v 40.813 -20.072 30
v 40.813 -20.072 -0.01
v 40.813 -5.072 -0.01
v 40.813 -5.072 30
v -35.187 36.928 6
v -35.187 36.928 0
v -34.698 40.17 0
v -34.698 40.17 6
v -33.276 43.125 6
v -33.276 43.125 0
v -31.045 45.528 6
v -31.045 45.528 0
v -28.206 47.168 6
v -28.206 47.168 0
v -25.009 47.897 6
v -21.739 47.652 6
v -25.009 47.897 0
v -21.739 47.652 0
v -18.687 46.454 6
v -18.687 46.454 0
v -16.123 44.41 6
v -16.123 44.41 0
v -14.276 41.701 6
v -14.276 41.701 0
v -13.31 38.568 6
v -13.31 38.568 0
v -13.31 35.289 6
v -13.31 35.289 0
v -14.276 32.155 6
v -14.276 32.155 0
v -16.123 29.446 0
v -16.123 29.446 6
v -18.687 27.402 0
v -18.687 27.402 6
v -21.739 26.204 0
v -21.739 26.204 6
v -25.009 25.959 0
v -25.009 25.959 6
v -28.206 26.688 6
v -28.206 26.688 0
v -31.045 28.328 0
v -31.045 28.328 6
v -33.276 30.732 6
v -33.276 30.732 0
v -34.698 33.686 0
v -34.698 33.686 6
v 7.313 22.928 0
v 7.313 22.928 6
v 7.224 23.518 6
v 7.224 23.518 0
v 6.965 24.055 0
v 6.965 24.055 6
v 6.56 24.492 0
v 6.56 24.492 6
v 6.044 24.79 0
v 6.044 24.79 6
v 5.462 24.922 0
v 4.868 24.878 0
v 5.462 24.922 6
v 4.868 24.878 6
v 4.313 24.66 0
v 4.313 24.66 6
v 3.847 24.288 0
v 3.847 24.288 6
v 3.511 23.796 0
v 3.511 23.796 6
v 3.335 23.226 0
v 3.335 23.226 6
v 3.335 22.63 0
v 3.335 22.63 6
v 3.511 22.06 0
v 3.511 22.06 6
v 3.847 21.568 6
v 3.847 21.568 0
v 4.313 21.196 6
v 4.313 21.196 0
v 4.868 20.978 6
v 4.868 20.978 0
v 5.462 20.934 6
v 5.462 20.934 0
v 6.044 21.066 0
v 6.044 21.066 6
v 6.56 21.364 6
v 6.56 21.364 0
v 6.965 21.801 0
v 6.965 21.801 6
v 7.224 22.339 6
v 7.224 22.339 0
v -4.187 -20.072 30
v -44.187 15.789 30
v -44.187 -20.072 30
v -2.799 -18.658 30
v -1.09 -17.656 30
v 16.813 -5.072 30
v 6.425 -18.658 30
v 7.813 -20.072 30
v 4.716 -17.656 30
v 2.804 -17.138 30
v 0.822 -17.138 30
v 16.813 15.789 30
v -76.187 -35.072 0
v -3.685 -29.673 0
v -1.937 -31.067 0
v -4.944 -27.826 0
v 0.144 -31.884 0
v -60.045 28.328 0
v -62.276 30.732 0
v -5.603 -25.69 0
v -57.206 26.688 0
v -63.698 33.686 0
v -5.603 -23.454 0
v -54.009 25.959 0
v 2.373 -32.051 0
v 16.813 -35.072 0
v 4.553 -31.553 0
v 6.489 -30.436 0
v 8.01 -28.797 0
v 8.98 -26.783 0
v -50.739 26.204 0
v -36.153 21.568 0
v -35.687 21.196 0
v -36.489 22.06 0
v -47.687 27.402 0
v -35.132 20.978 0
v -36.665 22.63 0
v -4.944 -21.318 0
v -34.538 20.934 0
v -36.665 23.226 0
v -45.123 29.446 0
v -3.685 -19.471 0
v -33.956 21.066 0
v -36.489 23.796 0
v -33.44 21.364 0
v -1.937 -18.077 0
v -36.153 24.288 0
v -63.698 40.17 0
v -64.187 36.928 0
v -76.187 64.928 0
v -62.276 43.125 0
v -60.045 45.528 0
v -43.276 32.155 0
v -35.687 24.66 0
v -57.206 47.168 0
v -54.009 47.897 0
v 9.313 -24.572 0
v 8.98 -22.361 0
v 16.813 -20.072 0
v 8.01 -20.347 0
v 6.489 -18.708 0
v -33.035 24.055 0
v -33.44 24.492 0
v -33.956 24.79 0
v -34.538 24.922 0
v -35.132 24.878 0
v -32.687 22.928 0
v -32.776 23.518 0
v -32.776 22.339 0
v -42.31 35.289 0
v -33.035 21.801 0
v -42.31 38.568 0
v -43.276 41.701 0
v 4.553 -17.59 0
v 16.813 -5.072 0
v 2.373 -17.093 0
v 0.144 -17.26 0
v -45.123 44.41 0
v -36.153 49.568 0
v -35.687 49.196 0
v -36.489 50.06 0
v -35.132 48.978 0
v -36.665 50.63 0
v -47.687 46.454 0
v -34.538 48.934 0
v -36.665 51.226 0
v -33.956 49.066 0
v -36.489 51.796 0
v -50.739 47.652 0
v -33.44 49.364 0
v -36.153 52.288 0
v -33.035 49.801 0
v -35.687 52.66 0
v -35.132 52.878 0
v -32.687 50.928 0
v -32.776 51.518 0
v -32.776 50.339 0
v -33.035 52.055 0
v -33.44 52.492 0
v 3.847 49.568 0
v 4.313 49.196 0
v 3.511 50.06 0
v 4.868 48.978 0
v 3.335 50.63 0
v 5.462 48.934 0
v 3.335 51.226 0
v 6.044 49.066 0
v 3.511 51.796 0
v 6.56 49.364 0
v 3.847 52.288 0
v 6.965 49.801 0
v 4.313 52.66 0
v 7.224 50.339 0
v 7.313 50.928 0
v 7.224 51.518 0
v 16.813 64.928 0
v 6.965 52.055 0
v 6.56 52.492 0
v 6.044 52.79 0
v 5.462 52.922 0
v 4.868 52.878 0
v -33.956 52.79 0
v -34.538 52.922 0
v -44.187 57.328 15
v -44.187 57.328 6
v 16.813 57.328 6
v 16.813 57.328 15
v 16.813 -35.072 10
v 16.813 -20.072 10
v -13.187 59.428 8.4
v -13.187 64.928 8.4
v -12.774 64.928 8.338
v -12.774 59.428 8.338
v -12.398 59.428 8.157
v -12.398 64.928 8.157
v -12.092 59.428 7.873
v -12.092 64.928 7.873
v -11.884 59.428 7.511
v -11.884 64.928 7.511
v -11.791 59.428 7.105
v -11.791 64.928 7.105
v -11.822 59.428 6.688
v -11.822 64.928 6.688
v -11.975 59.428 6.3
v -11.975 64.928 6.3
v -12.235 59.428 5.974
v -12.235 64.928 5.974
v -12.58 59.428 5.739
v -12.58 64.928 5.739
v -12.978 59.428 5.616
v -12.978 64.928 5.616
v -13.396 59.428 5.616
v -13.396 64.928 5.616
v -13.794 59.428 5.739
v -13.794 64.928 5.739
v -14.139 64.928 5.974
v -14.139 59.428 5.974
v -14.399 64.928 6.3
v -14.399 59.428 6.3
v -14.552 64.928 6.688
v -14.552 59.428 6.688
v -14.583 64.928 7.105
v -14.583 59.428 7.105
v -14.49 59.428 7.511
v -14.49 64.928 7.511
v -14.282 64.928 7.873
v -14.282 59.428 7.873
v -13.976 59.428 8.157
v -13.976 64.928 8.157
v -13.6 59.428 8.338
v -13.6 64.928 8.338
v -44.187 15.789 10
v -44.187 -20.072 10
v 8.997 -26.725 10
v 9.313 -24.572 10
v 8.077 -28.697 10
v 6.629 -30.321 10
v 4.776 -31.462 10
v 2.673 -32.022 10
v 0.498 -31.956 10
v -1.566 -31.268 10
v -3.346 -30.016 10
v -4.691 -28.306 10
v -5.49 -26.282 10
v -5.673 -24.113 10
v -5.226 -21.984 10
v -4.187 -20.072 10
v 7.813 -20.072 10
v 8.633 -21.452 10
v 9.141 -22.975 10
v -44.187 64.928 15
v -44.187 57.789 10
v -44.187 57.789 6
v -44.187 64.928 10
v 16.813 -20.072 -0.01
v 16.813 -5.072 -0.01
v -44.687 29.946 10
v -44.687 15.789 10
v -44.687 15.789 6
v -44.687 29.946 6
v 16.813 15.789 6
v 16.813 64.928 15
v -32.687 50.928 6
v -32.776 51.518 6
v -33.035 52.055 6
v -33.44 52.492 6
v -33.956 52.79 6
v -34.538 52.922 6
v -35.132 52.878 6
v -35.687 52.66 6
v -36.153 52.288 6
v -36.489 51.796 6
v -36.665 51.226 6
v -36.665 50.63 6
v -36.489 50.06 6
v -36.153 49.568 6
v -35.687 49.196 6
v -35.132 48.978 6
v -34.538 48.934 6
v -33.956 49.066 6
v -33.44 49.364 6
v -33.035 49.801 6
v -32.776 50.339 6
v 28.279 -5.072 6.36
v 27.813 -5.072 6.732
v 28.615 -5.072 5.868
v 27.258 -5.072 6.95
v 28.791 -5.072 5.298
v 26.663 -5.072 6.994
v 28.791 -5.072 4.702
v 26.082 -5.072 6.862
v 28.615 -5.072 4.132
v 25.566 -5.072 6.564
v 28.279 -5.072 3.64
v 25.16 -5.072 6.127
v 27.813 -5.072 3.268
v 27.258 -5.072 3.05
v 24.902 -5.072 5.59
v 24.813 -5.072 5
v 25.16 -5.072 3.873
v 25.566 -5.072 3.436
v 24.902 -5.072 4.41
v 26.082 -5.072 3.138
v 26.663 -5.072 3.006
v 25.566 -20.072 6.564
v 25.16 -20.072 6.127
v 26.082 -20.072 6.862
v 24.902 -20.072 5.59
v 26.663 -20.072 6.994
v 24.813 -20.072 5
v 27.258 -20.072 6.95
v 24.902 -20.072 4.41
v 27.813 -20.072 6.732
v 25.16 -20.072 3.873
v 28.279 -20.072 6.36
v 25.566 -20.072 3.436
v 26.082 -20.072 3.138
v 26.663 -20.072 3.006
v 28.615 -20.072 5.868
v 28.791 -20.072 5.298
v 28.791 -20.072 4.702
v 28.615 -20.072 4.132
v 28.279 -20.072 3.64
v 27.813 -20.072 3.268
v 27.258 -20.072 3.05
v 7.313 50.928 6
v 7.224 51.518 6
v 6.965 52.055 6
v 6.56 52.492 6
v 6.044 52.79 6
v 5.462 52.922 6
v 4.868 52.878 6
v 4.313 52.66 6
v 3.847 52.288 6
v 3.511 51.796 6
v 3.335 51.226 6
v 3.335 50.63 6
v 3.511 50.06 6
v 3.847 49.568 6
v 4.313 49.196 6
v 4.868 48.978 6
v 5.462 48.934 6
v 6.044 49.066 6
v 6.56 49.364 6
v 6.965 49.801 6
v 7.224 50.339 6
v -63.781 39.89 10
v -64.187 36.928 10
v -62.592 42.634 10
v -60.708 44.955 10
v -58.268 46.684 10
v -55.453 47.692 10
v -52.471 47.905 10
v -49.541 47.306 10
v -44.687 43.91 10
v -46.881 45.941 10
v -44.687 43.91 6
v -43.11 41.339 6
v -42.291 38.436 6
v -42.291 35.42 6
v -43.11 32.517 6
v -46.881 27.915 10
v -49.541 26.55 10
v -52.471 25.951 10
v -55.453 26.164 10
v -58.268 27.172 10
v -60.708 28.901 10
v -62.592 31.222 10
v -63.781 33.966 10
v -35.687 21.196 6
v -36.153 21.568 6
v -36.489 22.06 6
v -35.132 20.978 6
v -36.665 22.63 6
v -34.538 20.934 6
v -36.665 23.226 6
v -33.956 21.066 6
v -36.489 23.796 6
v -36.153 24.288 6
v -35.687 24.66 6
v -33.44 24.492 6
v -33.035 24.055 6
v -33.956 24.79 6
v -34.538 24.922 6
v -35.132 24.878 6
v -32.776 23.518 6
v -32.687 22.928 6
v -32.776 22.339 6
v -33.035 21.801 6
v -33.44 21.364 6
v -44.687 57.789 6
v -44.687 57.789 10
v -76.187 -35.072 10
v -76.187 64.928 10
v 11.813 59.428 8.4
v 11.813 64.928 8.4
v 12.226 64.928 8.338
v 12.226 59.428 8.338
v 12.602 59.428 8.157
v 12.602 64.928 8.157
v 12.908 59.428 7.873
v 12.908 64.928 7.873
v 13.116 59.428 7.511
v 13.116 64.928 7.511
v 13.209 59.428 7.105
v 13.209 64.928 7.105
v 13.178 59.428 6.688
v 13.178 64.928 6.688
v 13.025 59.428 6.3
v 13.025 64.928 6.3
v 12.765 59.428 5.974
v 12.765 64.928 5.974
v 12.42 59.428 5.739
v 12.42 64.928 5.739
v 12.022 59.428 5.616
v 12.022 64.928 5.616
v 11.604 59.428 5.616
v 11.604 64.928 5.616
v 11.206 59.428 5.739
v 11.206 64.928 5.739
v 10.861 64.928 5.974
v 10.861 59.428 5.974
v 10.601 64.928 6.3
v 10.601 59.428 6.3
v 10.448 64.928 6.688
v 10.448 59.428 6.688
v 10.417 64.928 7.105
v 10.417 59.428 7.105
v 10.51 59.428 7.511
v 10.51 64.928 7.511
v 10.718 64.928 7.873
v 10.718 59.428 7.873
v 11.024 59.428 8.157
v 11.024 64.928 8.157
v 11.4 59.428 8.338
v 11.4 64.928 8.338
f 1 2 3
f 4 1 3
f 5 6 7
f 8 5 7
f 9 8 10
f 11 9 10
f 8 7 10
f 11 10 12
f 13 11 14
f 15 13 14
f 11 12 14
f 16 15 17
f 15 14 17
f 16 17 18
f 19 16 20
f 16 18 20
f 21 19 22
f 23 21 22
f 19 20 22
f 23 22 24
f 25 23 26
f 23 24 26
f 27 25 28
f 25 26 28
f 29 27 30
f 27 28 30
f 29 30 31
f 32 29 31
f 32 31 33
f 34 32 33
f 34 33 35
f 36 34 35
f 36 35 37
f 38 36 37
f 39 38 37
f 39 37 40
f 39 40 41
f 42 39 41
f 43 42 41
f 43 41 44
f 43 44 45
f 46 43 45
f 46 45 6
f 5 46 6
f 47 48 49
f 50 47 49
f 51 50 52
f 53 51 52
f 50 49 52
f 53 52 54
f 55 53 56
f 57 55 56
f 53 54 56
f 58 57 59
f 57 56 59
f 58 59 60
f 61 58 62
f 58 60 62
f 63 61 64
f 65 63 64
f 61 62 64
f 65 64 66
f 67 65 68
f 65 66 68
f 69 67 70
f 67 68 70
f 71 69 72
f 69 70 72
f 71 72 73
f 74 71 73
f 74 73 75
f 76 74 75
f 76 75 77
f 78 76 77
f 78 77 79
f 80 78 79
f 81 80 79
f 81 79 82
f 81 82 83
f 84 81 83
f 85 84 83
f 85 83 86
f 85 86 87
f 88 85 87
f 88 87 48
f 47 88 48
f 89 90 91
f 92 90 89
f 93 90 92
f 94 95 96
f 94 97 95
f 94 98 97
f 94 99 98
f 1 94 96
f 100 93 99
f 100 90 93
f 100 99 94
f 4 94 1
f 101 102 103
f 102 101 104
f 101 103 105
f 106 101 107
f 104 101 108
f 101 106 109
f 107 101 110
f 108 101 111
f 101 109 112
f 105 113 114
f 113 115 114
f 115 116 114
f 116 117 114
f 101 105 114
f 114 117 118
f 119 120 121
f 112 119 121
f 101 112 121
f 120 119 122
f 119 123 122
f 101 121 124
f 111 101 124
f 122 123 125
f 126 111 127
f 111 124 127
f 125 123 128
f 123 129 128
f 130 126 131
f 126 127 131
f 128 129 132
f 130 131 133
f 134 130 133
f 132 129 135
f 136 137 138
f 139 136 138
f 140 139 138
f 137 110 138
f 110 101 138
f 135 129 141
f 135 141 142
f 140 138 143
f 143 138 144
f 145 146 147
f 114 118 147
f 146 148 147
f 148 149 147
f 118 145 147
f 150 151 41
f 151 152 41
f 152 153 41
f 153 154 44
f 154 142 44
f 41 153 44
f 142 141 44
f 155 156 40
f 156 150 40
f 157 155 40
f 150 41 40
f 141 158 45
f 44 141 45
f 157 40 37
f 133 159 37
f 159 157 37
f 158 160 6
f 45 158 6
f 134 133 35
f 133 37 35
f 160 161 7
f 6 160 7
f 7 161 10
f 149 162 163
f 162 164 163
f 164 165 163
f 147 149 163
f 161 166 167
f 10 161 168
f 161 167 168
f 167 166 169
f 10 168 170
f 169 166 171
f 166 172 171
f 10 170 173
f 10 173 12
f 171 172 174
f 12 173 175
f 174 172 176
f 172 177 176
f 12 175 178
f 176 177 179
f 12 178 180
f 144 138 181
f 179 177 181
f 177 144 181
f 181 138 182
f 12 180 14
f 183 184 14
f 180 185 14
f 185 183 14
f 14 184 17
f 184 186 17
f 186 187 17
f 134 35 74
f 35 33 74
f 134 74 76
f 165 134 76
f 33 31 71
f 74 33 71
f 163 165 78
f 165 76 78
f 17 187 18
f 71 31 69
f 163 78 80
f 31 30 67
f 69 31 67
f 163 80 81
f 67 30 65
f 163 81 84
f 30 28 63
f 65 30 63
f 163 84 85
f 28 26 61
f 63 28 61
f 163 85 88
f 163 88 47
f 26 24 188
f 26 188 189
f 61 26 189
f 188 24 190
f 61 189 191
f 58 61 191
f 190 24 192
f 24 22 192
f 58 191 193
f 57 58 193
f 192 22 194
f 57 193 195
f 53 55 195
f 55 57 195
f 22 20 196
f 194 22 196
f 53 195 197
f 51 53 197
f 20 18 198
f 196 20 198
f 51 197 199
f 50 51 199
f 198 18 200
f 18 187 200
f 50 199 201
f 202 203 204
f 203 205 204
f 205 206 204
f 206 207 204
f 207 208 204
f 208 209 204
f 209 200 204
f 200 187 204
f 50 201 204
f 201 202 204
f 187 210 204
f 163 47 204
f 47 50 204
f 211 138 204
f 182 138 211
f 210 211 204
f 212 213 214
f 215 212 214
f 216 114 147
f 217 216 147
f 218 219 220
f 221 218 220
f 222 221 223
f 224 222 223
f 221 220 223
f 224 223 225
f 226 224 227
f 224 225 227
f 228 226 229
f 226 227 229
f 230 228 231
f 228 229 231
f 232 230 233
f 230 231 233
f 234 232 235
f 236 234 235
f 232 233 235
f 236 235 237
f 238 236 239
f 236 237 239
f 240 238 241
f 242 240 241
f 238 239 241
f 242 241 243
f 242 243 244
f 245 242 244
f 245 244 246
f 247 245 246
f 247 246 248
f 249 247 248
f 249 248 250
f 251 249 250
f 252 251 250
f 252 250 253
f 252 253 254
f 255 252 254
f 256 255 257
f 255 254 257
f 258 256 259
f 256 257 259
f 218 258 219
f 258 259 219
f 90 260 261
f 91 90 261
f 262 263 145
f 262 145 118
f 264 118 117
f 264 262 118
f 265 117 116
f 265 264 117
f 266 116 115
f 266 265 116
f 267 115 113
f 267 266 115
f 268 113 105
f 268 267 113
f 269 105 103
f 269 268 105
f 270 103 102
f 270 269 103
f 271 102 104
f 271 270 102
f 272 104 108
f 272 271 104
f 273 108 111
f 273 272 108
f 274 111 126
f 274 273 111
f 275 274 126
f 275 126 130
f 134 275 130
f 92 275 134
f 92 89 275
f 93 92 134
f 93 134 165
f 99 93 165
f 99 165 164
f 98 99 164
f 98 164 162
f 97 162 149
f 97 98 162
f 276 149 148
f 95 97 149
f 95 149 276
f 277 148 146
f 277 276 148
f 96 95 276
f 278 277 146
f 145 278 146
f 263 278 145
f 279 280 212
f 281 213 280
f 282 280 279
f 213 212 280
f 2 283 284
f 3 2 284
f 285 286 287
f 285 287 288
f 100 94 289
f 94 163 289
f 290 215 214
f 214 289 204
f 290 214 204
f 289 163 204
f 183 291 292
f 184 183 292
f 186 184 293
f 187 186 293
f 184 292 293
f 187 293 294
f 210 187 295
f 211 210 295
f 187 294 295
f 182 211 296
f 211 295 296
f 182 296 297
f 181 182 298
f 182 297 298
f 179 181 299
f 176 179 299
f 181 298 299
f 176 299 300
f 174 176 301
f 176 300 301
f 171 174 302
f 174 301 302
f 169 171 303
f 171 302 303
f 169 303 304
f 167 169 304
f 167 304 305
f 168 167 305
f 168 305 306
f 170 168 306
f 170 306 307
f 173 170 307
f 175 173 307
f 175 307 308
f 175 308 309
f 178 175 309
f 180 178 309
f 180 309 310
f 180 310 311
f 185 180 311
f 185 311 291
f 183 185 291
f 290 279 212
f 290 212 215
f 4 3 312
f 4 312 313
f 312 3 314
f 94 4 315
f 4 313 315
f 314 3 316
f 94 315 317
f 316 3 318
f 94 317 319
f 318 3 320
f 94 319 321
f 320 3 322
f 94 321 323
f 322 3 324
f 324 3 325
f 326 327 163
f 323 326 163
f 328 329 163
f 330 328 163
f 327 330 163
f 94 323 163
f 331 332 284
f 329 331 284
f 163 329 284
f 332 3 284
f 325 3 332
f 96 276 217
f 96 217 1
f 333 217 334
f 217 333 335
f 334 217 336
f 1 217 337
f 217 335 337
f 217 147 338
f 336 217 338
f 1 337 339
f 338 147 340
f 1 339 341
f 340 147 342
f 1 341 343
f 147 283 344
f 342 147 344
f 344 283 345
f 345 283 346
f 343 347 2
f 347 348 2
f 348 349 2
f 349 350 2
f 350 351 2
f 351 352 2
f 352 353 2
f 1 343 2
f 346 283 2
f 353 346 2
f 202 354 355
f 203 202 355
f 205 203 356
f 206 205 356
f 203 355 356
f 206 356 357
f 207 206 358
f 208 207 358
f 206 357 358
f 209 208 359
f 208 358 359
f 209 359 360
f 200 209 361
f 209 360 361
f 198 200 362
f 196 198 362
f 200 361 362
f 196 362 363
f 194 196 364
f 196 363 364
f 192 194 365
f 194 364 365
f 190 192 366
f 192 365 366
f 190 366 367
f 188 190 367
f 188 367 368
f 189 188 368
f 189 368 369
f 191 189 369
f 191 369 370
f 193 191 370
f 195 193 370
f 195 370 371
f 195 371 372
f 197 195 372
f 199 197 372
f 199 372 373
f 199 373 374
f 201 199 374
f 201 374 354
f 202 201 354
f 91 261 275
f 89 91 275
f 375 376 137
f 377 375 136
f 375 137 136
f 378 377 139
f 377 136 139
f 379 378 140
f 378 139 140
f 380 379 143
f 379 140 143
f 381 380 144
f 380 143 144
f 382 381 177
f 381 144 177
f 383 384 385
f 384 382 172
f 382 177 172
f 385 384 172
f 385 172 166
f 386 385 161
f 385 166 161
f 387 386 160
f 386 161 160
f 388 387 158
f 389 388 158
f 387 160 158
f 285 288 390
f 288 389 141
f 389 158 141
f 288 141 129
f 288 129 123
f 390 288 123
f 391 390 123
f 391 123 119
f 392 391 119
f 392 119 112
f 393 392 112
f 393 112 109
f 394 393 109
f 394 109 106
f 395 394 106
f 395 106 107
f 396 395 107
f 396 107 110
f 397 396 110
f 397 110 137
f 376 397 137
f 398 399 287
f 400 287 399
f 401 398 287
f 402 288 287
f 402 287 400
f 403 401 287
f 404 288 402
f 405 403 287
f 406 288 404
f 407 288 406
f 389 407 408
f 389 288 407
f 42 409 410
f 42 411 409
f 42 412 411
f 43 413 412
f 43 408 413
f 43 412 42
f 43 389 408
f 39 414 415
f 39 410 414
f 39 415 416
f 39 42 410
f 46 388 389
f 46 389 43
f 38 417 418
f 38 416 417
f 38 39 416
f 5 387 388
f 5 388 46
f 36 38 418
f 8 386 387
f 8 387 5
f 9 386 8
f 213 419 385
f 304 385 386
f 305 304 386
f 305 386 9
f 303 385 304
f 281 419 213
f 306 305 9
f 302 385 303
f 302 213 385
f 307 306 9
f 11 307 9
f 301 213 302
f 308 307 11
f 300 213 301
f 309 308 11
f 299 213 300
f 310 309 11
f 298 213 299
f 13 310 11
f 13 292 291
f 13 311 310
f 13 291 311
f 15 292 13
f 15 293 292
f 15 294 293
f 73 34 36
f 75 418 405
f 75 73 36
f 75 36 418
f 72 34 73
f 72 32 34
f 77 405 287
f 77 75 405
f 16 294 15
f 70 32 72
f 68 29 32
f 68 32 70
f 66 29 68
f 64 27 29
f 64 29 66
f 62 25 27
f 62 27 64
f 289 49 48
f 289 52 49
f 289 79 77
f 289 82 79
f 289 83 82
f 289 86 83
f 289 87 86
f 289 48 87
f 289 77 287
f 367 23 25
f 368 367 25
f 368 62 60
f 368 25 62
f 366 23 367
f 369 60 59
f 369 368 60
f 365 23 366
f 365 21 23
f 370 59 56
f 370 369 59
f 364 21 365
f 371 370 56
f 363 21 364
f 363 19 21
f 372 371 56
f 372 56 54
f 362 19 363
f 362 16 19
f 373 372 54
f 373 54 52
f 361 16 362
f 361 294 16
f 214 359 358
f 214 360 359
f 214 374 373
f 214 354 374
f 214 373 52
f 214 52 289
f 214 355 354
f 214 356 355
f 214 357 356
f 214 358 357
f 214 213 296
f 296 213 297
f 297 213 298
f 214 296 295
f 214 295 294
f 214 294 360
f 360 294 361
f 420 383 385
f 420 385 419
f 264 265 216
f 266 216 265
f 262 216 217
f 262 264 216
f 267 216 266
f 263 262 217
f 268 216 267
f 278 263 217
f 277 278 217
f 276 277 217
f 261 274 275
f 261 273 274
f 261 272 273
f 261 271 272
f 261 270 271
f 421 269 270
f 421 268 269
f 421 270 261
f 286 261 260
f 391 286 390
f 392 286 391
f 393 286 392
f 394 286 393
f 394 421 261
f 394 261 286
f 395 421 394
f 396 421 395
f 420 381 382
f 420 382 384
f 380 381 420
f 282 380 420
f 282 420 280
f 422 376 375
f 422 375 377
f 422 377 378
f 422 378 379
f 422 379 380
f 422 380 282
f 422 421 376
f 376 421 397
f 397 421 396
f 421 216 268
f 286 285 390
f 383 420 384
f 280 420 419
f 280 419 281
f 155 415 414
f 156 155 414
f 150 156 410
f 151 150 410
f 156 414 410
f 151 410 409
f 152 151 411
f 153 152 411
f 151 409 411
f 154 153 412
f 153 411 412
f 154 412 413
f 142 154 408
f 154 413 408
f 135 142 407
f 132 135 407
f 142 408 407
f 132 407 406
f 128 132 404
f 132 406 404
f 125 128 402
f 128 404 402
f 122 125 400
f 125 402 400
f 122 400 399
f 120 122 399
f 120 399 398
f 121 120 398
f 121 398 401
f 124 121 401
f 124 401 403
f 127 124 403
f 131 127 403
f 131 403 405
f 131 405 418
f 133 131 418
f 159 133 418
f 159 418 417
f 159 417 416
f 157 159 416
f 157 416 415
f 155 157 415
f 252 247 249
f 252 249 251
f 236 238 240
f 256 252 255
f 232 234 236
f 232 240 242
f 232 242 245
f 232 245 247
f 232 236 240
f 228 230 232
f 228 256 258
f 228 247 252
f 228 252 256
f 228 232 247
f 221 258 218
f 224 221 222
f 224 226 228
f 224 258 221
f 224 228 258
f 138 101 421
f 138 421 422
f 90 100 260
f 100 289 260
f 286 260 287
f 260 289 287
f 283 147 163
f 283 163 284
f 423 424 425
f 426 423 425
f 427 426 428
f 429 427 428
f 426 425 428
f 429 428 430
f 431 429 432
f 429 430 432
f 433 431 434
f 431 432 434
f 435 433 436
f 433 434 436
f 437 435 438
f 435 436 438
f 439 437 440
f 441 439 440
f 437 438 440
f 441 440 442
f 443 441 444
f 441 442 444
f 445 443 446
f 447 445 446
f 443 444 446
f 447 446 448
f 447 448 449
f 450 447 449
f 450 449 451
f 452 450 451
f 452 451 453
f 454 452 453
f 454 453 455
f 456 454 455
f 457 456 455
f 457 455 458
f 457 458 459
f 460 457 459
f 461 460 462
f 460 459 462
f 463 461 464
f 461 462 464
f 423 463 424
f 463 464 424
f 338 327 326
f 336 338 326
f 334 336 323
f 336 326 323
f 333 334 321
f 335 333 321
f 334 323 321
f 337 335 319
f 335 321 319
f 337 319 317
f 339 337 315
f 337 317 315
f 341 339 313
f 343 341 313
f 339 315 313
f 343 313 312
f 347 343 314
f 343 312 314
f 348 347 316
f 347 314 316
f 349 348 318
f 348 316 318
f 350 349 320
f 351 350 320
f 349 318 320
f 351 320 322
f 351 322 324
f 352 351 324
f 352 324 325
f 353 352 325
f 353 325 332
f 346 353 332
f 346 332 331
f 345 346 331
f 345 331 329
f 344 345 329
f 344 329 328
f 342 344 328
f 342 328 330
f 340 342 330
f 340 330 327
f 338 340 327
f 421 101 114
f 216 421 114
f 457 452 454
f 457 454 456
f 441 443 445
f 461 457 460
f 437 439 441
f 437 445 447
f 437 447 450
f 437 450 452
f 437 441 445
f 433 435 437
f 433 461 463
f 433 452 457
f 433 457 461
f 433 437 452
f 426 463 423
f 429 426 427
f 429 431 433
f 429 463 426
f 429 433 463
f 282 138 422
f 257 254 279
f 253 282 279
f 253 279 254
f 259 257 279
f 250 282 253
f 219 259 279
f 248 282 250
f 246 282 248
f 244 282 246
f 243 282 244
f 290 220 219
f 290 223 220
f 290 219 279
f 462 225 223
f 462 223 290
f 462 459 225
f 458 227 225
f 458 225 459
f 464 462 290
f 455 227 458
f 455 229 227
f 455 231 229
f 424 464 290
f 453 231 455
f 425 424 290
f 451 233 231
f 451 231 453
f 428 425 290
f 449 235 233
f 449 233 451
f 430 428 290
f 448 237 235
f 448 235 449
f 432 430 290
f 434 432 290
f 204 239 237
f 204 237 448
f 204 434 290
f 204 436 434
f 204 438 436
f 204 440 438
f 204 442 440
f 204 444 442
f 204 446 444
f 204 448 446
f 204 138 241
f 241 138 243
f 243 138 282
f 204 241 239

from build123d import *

# Parameters (mm, degrees)
SKETCH1_W                = 93
SKETCH1_H                = 100
BOSS_EXTRUDE2_DEPTH      = 10
SKETCH4_W                = 10.01
SKETCH4_H                = 15
BOSS_EXTRUDE4_DEPTH      = 24
SKETCH5_R                = 2
CUT_EXTRUDE1_DEPTH       = 50
SKETCH7_R                = 11
CUT_EXTRUDE3_DEPTH       = 50
SKETCH14_W               = 61.5
SKETCH14_H               = 42
CUT_EXTRUDE8_DEPTH       = 4
BOSS_EXTRUDE5_START      = -4
SKETCH16_W               = 61
SKETCH16_H               = 7.6
BOSS_EXTRUDE5_DEPTH      = 9
BOSS_EXTRUDE6_DEPTH      = 20
SKETCH19_R               = 11
CUT_EXTRUDE11_DEPTH      = 15
SKETCH20_R               = 2
CUT_EXTRUDE12_DEPTH      = 10
SKETCH8_R                = 1.4
CUT_EXTRUDE4_DEPTH       = 5.5
CUT_EXTRUDE13_DEPTH      = 103.078985596
CUT_EXTRUDE13_DEPTH_BACK = 103.078985596
SKETCH6_R                = 7.5


# Read off the part's stored shape, not the designer's step: Boss-Extrude6
with BuildPart() as part:
    # Sketch1 → Boss-Extrude2 (new body)
    with BuildSketch(Plane.XY):
        with Locations((-29.68705036, 14.928057554)):
            Rectangle(SKETCH1_W, SKETCH1_H)
    extrude(amount=BOSS_EXTRUDE2_DEPTH)

    # Sketch4 → Boss-Extrude4 (add)
    with BuildSketch(Plane(origin=(16.81294964, 0, 0), x_dir=(0, 0, -1), z_dir=(1, 0, 0))):
        with Locations((-4.995, -12.571942446)):
            Rectangle(SKETCH4_W, SKETCH4_H)
    extrude(amount=BOSS_EXTRUDE4_DEPTH)

    # Sketch5 → Cut-Extrude1 (cut)
    with BuildSketch(Plane(origin=(0, -5.071942446, 0), x_dir=(1, 0, 0), z_dir=(0, 1, 0))):
        with Locations(Location((26.81294964, -5, 0), (0, 0, 180))):
            Circle(SKETCH5_R)
    extrude(amount=-CUT_EXTRUDE1_DEPTH, mode=Mode.SUBTRACT)

    # Sketch7 → Cut-Extrude3 (cut)
    with BuildSketch(Plane(origin=(0, 0, 0), x_dir=(-1, 0, 0), z_dir=(0, 0, -1))):
        with Locations((24.18705036, 36.928057554)):
            Circle(SKETCH7_R)
    extrude(amount=-CUT_EXTRUDE3_DEPTH, mode=Mode.SUBTRACT)

    # Sketch14 → Cut-Extrude8 (cut)
    with BuildSketch(Plane.XY.offset(10)):
        with Locations((-13.93705036, 36.789132279)):
            Rectangle(SKETCH14_W, SKETCH14_H)
    extrude(amount=-CUT_EXTRUDE8_DEPTH, mode=Mode.SUBTRACT)

    # Sketch16 → Boss-Extrude5 (add)
    with BuildSketch(Plane.XY.offset(10).offset(BOSS_EXTRUDE5_START)):
        with Locations((-13.68705036, 61.128057554)):
            Rectangle(SKETCH16_W, SKETCH16_H)
    extrude(amount=BOSS_EXTRUDE5_DEPTH)

    # Boss-Extrude6 outline → Boss-Extrude6 (add)
    with BuildSketch(Plane.XY.offset(10)):
        Polygon((40.81294964, -5.071942446), (16.81294964, -5.071942446), (16.81294964, 15.789132279), (-44.18705036, 15.789132279), (-44.18705036, -20.071942446), (40.81294964, -20.071942446), align=None)
    extrude(amount=BOSS_EXTRUDE6_DEPTH)

    # Sketch19 → Cut-Extrude11 (cut)
    with BuildSketch(Plane(origin=(0, 0, 0), x_dir=(-1, 0, 0), z_dir=(0, 0, -1))):
        with Locations((53.18705036, 36.928057554)):
            Circle(SKETCH19_R)
    extrude(amount=-CUT_EXTRUDE11_DEPTH, mode=Mode.SUBTRACT)

    # Sketch20 → Cut-Extrude12 (cut)
    with BuildSketch(Plane.XY.offset(6)):
        with Locations((-34.68705036, 50.928057554)):
            Circle(SKETCH20_R)
        with Locations((5.31294964, 50.928057554)):
            Circle(SKETCH20_R)
        with Locations((-34.68705036, 22.928057554)):
            Circle(SKETCH20_R)
        with Locations((5.31294964, 22.928057554)):
            Circle(SKETCH20_R)
    extrude(amount=-CUT_EXTRUDE12_DEPTH, mode=Mode.SUBTRACT)

    # Sketch8 → Cut-Extrude4 (cut)
    with BuildSketch(Plane(origin=(0, 64.928057554, 0), x_dir=(1, 0, 0), z_dir=(0, 1, 0))):
        with Locations(Location((-13.18705036, -7, 0), (0, 0, 270))):
            Circle(SKETCH8_R)
        with Locations(Location((11.81294964, -7, 0), (0, 0, 270))):
            Circle(SKETCH8_R)
    extrude(amount=-CUT_EXTRUDE4_DEPTH, mode=Mode.SUBTRACT)

    # Sketch6 → Cut-Extrude13 (cut, two sides: drawn at the far end of the back side and taken through both)
    with BuildSketch(Plane(origin=(0, 0, 10), x_dir=(-1, 0, 0), z_dir=(0, 0, -1)).offset(-CUT_EXTRUDE13_DEPTH_BACK)):
        with Locations(Location((-1.81294964, -24.571942446, 0), (0, 0, 180))):
            Circle(SKETCH6_R)
    extrude(amount=CUT_EXTRUDE13_DEPTH + CUT_EXTRUDE13_DEPTH_BACK, mode=Mode.SUBTRACT)


solid = part.part
